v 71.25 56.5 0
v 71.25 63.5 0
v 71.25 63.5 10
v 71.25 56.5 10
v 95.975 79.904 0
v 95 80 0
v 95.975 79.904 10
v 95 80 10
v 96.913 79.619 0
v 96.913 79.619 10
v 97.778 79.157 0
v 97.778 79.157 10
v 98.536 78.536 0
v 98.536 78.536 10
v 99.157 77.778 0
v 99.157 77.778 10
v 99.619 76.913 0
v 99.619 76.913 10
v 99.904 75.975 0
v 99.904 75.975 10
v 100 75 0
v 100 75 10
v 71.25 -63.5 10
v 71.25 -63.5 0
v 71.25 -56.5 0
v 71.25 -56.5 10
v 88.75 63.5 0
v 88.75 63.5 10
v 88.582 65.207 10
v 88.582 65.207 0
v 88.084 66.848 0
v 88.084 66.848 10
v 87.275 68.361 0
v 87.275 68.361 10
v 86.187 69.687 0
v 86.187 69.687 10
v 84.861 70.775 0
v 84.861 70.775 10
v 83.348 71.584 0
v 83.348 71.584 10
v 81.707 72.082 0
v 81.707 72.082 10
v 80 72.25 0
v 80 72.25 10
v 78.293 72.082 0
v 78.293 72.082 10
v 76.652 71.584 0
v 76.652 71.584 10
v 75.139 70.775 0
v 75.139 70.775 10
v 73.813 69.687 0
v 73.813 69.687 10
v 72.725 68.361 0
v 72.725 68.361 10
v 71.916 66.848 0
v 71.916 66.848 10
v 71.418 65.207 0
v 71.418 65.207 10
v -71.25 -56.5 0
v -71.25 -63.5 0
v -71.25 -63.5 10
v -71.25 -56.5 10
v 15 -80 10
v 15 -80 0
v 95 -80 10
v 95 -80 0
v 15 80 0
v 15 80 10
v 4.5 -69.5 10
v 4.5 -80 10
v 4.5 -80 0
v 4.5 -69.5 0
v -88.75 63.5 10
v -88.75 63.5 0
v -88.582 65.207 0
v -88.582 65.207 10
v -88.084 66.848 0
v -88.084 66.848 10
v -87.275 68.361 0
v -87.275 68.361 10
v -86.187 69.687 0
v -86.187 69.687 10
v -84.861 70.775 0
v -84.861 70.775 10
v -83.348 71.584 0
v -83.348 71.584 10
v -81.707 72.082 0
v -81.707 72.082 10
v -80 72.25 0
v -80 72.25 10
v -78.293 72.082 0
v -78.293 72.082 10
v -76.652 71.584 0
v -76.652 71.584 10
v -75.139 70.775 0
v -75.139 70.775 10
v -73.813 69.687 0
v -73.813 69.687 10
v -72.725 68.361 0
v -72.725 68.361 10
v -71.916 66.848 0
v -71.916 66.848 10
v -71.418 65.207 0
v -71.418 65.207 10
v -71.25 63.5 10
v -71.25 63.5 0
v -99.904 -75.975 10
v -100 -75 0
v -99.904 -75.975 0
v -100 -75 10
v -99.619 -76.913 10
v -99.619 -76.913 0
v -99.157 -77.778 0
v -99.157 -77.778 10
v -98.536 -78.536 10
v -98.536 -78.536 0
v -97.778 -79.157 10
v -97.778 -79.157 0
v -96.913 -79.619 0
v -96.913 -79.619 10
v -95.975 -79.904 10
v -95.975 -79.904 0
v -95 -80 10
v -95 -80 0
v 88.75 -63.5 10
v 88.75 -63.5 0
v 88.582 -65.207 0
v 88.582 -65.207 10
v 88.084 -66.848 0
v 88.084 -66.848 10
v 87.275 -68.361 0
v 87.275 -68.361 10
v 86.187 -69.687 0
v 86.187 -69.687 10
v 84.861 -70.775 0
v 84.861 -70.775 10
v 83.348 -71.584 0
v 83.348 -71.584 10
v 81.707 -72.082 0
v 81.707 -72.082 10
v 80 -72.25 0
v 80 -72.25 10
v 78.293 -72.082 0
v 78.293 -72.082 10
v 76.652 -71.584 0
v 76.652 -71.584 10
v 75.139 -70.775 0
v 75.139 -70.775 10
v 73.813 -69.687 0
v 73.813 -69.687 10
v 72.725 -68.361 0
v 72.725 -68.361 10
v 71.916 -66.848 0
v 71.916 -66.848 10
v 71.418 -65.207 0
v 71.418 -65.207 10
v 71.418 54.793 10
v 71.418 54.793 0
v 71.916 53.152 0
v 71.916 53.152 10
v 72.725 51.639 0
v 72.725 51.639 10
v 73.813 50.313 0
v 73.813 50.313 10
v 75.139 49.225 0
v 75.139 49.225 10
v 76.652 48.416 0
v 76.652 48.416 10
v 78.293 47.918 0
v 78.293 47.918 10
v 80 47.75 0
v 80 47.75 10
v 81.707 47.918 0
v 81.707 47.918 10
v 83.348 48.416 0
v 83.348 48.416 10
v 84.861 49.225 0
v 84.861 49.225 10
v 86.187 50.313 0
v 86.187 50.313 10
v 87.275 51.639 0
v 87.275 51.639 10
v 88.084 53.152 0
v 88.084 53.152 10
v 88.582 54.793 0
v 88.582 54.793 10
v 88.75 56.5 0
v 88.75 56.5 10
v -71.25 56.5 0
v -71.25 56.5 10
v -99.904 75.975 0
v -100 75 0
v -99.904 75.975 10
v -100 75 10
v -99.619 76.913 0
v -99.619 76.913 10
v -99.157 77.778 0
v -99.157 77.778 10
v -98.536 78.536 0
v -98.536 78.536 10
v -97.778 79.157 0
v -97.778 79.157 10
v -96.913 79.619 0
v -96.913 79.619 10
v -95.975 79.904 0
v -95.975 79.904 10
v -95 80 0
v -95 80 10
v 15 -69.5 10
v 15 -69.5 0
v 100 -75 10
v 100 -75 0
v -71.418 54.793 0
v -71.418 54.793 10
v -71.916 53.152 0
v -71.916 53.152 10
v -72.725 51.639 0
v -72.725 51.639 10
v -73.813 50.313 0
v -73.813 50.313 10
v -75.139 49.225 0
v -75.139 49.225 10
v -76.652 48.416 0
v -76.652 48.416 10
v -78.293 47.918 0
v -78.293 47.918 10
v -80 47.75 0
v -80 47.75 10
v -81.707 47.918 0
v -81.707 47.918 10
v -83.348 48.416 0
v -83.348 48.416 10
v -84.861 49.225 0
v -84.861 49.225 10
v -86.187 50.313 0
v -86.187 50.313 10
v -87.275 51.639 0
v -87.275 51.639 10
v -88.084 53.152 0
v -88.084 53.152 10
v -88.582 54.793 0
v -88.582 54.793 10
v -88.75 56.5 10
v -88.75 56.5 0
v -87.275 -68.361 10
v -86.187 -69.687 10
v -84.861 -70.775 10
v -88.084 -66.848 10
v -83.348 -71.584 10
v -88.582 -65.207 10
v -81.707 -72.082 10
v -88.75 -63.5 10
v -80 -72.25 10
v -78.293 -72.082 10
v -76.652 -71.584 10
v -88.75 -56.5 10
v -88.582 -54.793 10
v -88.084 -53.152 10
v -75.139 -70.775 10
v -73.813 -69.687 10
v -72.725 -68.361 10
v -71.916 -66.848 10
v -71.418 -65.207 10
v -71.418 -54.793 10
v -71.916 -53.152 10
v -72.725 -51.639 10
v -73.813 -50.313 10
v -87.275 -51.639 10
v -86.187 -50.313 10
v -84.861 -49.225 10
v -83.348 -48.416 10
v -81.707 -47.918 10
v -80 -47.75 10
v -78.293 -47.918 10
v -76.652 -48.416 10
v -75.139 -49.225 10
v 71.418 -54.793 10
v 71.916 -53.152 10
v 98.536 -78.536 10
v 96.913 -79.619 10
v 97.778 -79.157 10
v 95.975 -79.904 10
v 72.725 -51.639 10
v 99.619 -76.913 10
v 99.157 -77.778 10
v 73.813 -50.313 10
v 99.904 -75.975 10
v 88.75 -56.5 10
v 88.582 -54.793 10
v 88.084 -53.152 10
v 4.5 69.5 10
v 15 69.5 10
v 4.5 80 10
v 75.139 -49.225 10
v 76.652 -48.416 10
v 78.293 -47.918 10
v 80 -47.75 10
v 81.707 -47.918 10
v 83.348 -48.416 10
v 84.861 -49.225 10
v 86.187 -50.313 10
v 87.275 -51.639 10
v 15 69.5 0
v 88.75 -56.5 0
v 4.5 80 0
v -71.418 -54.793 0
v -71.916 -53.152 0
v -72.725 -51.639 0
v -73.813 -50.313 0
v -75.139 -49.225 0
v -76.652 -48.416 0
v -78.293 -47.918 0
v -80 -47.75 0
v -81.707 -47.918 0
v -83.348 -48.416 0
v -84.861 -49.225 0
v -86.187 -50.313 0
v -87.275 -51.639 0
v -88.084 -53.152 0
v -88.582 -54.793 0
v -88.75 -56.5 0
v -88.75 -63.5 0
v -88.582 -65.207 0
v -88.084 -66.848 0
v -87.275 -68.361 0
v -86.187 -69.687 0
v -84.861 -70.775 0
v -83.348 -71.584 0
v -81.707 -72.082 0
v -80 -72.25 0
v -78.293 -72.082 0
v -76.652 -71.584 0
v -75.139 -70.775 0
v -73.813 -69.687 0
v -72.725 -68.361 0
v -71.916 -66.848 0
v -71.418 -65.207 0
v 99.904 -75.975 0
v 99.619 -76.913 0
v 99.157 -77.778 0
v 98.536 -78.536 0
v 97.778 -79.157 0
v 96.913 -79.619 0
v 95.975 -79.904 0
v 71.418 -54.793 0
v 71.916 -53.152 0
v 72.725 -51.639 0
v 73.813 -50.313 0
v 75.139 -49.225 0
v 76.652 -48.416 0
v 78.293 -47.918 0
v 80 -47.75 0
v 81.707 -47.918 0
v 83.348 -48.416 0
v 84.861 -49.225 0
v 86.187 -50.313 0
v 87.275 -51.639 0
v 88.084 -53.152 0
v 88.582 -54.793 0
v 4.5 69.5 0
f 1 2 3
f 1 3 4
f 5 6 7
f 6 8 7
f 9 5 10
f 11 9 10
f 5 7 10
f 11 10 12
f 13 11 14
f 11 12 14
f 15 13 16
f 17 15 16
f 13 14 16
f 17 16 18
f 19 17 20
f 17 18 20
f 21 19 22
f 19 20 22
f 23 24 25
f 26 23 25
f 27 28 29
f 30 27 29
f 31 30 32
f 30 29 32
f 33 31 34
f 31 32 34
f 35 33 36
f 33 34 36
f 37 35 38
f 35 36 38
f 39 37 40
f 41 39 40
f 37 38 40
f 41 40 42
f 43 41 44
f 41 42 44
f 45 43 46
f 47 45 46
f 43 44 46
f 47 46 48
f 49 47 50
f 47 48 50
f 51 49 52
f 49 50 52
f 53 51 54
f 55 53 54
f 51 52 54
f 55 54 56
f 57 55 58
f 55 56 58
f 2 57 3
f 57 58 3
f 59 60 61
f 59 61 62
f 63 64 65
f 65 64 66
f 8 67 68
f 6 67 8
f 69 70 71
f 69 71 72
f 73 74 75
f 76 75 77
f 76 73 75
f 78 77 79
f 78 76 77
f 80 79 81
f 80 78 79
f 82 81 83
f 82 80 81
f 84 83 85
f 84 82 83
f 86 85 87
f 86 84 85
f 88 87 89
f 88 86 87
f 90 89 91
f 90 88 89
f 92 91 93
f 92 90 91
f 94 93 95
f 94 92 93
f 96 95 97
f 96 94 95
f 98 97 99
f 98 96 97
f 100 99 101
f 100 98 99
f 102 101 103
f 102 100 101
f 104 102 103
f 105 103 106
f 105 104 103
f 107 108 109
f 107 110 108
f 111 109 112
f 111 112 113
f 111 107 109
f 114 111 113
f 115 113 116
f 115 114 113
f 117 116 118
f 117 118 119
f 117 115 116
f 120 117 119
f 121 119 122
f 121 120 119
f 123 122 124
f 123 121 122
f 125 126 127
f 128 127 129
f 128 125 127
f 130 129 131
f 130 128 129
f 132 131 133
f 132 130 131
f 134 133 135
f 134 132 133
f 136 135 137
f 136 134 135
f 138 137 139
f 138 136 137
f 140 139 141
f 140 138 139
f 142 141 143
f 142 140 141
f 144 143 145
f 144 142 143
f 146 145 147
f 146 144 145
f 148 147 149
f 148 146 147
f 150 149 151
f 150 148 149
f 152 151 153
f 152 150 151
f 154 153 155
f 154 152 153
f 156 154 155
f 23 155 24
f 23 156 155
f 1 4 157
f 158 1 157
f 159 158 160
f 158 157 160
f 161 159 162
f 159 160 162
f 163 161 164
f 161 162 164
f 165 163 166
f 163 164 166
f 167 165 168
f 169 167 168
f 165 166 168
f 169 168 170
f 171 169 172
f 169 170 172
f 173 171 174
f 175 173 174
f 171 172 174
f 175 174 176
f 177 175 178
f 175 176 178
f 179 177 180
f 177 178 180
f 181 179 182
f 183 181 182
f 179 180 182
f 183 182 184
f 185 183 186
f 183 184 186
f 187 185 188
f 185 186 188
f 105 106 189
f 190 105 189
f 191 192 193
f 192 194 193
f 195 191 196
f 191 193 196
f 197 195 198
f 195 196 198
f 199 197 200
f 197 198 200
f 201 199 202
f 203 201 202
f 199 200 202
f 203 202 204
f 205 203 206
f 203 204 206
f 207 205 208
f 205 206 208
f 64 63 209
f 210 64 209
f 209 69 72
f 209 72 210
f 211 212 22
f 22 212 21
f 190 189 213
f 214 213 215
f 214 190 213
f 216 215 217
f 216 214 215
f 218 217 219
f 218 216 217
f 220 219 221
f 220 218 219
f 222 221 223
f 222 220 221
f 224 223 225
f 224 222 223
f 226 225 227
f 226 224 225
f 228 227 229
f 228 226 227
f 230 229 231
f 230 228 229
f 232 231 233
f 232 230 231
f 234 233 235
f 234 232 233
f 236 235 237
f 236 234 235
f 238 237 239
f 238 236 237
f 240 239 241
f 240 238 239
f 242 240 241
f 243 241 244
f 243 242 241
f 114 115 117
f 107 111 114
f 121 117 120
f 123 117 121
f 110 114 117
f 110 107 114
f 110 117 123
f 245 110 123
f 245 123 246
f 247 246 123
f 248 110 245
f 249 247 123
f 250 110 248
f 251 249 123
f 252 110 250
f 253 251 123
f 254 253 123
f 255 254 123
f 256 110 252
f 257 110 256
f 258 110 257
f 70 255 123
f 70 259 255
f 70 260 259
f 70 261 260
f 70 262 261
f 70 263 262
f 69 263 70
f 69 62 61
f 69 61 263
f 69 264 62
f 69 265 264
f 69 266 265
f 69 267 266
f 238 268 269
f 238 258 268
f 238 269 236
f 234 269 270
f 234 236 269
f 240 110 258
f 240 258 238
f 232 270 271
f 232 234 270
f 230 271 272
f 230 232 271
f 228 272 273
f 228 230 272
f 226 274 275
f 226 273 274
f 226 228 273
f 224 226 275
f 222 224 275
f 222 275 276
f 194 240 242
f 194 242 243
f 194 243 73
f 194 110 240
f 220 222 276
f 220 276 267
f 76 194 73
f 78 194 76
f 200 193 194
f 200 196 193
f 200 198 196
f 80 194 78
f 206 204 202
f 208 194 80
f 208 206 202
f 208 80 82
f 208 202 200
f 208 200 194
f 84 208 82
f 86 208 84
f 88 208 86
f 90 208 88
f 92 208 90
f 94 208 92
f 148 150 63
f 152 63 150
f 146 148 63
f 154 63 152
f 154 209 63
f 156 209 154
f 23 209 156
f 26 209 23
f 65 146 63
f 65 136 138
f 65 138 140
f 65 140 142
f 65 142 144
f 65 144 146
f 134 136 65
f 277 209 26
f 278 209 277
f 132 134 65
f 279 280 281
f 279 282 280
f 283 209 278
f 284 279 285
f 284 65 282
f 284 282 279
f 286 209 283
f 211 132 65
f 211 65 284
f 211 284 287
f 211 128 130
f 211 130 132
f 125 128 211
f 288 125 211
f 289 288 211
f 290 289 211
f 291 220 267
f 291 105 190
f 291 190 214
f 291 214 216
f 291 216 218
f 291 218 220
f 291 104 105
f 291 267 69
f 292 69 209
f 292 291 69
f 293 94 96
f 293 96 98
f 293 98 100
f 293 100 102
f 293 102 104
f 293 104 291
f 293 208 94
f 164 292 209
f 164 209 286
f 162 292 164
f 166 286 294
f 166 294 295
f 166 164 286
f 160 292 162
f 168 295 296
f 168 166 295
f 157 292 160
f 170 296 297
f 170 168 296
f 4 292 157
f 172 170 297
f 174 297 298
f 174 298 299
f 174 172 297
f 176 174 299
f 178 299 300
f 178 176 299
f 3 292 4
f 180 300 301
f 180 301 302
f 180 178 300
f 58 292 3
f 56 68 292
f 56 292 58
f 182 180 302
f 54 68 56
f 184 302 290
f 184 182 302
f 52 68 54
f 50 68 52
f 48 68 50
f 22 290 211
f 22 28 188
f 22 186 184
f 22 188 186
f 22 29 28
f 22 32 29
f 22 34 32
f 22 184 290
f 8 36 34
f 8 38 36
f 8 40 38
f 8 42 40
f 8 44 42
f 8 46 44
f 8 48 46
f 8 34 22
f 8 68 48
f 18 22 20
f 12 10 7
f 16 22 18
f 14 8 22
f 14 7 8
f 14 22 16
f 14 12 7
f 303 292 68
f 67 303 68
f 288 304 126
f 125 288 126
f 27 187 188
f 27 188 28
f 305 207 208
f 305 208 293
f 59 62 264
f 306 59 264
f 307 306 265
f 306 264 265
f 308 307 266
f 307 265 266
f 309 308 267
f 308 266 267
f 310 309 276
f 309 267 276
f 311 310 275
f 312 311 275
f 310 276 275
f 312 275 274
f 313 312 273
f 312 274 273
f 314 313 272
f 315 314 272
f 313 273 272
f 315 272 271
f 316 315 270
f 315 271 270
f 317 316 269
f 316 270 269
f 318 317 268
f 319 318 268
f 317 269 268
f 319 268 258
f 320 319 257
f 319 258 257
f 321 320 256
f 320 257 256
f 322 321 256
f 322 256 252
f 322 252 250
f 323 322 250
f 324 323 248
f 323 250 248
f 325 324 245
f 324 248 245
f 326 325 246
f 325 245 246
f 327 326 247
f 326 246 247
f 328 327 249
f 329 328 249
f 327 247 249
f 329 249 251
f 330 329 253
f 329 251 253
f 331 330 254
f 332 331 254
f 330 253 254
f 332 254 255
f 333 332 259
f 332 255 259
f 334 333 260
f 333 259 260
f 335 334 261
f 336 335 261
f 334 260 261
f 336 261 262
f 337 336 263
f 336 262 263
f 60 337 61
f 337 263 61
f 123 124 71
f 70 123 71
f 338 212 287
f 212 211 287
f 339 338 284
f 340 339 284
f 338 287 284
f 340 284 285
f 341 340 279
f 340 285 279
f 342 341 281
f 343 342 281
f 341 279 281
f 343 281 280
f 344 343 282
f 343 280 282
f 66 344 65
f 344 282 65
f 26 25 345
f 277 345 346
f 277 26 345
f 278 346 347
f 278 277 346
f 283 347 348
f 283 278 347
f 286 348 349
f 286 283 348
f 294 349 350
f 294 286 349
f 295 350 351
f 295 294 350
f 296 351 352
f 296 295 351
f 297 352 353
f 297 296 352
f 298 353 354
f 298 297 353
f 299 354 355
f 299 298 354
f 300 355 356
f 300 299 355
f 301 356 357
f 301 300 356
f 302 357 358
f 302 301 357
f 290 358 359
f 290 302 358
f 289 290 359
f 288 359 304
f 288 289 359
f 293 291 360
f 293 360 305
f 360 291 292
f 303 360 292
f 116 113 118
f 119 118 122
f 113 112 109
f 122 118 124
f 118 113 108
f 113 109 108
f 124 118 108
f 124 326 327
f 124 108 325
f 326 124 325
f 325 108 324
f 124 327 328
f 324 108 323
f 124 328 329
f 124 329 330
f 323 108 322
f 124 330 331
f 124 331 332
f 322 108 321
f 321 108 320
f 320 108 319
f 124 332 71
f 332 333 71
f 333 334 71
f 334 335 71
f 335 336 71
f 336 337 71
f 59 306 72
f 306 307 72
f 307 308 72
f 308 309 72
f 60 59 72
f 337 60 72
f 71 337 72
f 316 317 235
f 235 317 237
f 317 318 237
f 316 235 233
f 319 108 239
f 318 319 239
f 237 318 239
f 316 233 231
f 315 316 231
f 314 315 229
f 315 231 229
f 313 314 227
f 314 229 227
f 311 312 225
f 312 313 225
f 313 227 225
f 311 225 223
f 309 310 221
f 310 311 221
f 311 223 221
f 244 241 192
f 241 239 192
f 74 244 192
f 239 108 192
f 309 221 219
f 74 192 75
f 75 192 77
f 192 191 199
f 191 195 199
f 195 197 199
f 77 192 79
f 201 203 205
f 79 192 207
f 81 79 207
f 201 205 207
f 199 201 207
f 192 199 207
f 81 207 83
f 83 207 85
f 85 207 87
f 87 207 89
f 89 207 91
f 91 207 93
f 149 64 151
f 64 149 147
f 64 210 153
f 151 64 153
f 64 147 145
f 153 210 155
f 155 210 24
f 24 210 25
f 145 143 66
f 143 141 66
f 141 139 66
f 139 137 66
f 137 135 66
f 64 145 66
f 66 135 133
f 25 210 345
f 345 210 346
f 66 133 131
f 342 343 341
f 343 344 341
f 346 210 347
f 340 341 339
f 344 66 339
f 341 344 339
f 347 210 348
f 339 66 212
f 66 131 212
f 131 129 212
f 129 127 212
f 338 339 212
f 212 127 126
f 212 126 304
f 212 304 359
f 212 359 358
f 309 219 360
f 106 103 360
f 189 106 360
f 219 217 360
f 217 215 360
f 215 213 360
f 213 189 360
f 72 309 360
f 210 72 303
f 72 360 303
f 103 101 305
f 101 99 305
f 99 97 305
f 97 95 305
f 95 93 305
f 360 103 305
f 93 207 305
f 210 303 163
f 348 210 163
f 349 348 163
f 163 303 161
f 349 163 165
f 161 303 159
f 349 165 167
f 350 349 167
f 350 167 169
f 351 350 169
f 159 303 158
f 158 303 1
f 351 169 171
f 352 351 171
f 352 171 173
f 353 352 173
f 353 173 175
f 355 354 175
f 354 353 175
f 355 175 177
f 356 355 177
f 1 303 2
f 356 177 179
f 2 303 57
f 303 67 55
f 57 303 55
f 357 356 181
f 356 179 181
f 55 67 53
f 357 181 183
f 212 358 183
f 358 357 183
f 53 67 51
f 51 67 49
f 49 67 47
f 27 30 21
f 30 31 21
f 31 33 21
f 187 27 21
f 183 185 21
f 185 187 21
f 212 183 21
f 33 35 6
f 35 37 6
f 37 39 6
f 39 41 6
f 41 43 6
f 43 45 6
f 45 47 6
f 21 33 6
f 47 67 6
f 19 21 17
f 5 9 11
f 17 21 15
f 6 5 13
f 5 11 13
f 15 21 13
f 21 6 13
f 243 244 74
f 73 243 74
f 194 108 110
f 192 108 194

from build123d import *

# Parameters (mm, degrees)
ESQUISSE1_W             = 200
ESQUISSE1_H             = 160
ESQUISSE1_R             = 8.75
BOSS_EXTRU_1_DEPTH      = 10
ESQUISSE2_W             = 10.5
ESQUISSE2_H             = 10.5
ENL_V_MAT_EXTRU_1_DEPTH = 10
CONG_1_R                = 5
ENL_V_MAT_EXTRU_2_DEPTH = 11
SYM_TRIE2_COPY_1_DEPTH  = 11


with BuildPart() as part:
    # Esquisse1 → Boss.-Extru.1 (new body)
    with BuildSketch(Plane.XY):
        Rectangle(ESQUISSE1_W, ESQUISSE1_H)
        with Locations((-80, 60)):
            Circle(ESQUISSE1_R, mode=Mode.SUBTRACT)
        with Locations((80, 60)):
            Circle(ESQUISSE1_R, mode=Mode.SUBTRACT)
        with Locations((80, -60)):
            Circle(ESQUISSE1_R, mode=Mode.SUBTRACT)
        with Locations((-80, -60)):
            Circle(ESQUISSE1_R, mode=Mode.SUBTRACT)
    extrude(amount=BOSS_EXTRU_1_DEPTH)

    # Esquisse2 → Enlèv. mat.-Extru.1 (cut)
    with BuildSketch(Plane.XY.offset(10)):
        with Locations((9.75, 74.75)):
            Rectangle(ESQUISSE2_W, ESQUISSE2_H)
        with Locations((9.75, -74.75)):
            Rectangle(ESQUISSE2_W, ESQUISSE2_H)
    extrude(amount=-ENL_V_MAT_EXTRU_1_DEPTH, mode=Mode.SUBTRACT)

    # Congé1
    cong_1_edges = [part.edges().sort_by_distance(p)[0] for p in [
        (-100, 80, 5),
        (100, 80, 5),
        (100, -80, 5),
        (-100, -80, 5),
    ]]
    fillet(cong_1_edges, radius=CONG_1_R)

    # Esquisse3 → Enlèv. mat.-Extru.2 (cut, through all)
    with BuildSketch(Plane.XY.offset(10)):
        with BuildLine():
            Line((-71.25, 63.5), (-71.25, 56.5))
            ThreePointArc((-71.25, 56.5), (-80, 47.75), (-88.75, 56.5))
            Line((-88.75, 56.5), (-88.75, 63.5))
            ThreePointArc((-88.75, 63.5), (-80, 72.25), (-71.25, 63.5))
        make_face()
    enl_v_mat_extru_2 = extrude(amount=-ENL_V_MAT_EXTRU_2_DEPTH, mode=Mode.SUBTRACT)

    # Symétrie1: Enlèv. mat.-Extru.2 across plane
    add(enl_v_mat_extru_2.mirror(Plane.ZX), mode=Mode.SUBTRACT)

    # Symétrie2: Enlèv. mat.-Extru.2 across plane
    add(enl_v_mat_extru_2.mirror(Plane(origin=(0, 0, 0), x_dir=(0, 0, 1), z_dir=(1, 0, 0))), mode=Mode.SUBTRACT)

    # Symétrie2 copy 1 sketch → Symétrie2 copy 1 (cut, through all)
    with BuildSketch(Plane(origin=(0, 0, 10), x_dir=(-1, 0, 0), z_dir=(0, 0, 1))):
        with BuildLine():
            Line((-71.25, 63.5), (-71.25, 56.5))
            ThreePointArc((-71.25, 56.5), (-80, 47.75), (-88.75, 56.5))
            Line((-88.75, 56.5), (-88.75, 63.5))
            ThreePointArc((-88.75, 63.5), (-80, 72.25), (-71.25, 63.5))
        make_face()
    extrude(amount=-SYM_TRIE2_COPY_1_DEPTH, mode=Mode.SUBTRACT)


solid = part.part
